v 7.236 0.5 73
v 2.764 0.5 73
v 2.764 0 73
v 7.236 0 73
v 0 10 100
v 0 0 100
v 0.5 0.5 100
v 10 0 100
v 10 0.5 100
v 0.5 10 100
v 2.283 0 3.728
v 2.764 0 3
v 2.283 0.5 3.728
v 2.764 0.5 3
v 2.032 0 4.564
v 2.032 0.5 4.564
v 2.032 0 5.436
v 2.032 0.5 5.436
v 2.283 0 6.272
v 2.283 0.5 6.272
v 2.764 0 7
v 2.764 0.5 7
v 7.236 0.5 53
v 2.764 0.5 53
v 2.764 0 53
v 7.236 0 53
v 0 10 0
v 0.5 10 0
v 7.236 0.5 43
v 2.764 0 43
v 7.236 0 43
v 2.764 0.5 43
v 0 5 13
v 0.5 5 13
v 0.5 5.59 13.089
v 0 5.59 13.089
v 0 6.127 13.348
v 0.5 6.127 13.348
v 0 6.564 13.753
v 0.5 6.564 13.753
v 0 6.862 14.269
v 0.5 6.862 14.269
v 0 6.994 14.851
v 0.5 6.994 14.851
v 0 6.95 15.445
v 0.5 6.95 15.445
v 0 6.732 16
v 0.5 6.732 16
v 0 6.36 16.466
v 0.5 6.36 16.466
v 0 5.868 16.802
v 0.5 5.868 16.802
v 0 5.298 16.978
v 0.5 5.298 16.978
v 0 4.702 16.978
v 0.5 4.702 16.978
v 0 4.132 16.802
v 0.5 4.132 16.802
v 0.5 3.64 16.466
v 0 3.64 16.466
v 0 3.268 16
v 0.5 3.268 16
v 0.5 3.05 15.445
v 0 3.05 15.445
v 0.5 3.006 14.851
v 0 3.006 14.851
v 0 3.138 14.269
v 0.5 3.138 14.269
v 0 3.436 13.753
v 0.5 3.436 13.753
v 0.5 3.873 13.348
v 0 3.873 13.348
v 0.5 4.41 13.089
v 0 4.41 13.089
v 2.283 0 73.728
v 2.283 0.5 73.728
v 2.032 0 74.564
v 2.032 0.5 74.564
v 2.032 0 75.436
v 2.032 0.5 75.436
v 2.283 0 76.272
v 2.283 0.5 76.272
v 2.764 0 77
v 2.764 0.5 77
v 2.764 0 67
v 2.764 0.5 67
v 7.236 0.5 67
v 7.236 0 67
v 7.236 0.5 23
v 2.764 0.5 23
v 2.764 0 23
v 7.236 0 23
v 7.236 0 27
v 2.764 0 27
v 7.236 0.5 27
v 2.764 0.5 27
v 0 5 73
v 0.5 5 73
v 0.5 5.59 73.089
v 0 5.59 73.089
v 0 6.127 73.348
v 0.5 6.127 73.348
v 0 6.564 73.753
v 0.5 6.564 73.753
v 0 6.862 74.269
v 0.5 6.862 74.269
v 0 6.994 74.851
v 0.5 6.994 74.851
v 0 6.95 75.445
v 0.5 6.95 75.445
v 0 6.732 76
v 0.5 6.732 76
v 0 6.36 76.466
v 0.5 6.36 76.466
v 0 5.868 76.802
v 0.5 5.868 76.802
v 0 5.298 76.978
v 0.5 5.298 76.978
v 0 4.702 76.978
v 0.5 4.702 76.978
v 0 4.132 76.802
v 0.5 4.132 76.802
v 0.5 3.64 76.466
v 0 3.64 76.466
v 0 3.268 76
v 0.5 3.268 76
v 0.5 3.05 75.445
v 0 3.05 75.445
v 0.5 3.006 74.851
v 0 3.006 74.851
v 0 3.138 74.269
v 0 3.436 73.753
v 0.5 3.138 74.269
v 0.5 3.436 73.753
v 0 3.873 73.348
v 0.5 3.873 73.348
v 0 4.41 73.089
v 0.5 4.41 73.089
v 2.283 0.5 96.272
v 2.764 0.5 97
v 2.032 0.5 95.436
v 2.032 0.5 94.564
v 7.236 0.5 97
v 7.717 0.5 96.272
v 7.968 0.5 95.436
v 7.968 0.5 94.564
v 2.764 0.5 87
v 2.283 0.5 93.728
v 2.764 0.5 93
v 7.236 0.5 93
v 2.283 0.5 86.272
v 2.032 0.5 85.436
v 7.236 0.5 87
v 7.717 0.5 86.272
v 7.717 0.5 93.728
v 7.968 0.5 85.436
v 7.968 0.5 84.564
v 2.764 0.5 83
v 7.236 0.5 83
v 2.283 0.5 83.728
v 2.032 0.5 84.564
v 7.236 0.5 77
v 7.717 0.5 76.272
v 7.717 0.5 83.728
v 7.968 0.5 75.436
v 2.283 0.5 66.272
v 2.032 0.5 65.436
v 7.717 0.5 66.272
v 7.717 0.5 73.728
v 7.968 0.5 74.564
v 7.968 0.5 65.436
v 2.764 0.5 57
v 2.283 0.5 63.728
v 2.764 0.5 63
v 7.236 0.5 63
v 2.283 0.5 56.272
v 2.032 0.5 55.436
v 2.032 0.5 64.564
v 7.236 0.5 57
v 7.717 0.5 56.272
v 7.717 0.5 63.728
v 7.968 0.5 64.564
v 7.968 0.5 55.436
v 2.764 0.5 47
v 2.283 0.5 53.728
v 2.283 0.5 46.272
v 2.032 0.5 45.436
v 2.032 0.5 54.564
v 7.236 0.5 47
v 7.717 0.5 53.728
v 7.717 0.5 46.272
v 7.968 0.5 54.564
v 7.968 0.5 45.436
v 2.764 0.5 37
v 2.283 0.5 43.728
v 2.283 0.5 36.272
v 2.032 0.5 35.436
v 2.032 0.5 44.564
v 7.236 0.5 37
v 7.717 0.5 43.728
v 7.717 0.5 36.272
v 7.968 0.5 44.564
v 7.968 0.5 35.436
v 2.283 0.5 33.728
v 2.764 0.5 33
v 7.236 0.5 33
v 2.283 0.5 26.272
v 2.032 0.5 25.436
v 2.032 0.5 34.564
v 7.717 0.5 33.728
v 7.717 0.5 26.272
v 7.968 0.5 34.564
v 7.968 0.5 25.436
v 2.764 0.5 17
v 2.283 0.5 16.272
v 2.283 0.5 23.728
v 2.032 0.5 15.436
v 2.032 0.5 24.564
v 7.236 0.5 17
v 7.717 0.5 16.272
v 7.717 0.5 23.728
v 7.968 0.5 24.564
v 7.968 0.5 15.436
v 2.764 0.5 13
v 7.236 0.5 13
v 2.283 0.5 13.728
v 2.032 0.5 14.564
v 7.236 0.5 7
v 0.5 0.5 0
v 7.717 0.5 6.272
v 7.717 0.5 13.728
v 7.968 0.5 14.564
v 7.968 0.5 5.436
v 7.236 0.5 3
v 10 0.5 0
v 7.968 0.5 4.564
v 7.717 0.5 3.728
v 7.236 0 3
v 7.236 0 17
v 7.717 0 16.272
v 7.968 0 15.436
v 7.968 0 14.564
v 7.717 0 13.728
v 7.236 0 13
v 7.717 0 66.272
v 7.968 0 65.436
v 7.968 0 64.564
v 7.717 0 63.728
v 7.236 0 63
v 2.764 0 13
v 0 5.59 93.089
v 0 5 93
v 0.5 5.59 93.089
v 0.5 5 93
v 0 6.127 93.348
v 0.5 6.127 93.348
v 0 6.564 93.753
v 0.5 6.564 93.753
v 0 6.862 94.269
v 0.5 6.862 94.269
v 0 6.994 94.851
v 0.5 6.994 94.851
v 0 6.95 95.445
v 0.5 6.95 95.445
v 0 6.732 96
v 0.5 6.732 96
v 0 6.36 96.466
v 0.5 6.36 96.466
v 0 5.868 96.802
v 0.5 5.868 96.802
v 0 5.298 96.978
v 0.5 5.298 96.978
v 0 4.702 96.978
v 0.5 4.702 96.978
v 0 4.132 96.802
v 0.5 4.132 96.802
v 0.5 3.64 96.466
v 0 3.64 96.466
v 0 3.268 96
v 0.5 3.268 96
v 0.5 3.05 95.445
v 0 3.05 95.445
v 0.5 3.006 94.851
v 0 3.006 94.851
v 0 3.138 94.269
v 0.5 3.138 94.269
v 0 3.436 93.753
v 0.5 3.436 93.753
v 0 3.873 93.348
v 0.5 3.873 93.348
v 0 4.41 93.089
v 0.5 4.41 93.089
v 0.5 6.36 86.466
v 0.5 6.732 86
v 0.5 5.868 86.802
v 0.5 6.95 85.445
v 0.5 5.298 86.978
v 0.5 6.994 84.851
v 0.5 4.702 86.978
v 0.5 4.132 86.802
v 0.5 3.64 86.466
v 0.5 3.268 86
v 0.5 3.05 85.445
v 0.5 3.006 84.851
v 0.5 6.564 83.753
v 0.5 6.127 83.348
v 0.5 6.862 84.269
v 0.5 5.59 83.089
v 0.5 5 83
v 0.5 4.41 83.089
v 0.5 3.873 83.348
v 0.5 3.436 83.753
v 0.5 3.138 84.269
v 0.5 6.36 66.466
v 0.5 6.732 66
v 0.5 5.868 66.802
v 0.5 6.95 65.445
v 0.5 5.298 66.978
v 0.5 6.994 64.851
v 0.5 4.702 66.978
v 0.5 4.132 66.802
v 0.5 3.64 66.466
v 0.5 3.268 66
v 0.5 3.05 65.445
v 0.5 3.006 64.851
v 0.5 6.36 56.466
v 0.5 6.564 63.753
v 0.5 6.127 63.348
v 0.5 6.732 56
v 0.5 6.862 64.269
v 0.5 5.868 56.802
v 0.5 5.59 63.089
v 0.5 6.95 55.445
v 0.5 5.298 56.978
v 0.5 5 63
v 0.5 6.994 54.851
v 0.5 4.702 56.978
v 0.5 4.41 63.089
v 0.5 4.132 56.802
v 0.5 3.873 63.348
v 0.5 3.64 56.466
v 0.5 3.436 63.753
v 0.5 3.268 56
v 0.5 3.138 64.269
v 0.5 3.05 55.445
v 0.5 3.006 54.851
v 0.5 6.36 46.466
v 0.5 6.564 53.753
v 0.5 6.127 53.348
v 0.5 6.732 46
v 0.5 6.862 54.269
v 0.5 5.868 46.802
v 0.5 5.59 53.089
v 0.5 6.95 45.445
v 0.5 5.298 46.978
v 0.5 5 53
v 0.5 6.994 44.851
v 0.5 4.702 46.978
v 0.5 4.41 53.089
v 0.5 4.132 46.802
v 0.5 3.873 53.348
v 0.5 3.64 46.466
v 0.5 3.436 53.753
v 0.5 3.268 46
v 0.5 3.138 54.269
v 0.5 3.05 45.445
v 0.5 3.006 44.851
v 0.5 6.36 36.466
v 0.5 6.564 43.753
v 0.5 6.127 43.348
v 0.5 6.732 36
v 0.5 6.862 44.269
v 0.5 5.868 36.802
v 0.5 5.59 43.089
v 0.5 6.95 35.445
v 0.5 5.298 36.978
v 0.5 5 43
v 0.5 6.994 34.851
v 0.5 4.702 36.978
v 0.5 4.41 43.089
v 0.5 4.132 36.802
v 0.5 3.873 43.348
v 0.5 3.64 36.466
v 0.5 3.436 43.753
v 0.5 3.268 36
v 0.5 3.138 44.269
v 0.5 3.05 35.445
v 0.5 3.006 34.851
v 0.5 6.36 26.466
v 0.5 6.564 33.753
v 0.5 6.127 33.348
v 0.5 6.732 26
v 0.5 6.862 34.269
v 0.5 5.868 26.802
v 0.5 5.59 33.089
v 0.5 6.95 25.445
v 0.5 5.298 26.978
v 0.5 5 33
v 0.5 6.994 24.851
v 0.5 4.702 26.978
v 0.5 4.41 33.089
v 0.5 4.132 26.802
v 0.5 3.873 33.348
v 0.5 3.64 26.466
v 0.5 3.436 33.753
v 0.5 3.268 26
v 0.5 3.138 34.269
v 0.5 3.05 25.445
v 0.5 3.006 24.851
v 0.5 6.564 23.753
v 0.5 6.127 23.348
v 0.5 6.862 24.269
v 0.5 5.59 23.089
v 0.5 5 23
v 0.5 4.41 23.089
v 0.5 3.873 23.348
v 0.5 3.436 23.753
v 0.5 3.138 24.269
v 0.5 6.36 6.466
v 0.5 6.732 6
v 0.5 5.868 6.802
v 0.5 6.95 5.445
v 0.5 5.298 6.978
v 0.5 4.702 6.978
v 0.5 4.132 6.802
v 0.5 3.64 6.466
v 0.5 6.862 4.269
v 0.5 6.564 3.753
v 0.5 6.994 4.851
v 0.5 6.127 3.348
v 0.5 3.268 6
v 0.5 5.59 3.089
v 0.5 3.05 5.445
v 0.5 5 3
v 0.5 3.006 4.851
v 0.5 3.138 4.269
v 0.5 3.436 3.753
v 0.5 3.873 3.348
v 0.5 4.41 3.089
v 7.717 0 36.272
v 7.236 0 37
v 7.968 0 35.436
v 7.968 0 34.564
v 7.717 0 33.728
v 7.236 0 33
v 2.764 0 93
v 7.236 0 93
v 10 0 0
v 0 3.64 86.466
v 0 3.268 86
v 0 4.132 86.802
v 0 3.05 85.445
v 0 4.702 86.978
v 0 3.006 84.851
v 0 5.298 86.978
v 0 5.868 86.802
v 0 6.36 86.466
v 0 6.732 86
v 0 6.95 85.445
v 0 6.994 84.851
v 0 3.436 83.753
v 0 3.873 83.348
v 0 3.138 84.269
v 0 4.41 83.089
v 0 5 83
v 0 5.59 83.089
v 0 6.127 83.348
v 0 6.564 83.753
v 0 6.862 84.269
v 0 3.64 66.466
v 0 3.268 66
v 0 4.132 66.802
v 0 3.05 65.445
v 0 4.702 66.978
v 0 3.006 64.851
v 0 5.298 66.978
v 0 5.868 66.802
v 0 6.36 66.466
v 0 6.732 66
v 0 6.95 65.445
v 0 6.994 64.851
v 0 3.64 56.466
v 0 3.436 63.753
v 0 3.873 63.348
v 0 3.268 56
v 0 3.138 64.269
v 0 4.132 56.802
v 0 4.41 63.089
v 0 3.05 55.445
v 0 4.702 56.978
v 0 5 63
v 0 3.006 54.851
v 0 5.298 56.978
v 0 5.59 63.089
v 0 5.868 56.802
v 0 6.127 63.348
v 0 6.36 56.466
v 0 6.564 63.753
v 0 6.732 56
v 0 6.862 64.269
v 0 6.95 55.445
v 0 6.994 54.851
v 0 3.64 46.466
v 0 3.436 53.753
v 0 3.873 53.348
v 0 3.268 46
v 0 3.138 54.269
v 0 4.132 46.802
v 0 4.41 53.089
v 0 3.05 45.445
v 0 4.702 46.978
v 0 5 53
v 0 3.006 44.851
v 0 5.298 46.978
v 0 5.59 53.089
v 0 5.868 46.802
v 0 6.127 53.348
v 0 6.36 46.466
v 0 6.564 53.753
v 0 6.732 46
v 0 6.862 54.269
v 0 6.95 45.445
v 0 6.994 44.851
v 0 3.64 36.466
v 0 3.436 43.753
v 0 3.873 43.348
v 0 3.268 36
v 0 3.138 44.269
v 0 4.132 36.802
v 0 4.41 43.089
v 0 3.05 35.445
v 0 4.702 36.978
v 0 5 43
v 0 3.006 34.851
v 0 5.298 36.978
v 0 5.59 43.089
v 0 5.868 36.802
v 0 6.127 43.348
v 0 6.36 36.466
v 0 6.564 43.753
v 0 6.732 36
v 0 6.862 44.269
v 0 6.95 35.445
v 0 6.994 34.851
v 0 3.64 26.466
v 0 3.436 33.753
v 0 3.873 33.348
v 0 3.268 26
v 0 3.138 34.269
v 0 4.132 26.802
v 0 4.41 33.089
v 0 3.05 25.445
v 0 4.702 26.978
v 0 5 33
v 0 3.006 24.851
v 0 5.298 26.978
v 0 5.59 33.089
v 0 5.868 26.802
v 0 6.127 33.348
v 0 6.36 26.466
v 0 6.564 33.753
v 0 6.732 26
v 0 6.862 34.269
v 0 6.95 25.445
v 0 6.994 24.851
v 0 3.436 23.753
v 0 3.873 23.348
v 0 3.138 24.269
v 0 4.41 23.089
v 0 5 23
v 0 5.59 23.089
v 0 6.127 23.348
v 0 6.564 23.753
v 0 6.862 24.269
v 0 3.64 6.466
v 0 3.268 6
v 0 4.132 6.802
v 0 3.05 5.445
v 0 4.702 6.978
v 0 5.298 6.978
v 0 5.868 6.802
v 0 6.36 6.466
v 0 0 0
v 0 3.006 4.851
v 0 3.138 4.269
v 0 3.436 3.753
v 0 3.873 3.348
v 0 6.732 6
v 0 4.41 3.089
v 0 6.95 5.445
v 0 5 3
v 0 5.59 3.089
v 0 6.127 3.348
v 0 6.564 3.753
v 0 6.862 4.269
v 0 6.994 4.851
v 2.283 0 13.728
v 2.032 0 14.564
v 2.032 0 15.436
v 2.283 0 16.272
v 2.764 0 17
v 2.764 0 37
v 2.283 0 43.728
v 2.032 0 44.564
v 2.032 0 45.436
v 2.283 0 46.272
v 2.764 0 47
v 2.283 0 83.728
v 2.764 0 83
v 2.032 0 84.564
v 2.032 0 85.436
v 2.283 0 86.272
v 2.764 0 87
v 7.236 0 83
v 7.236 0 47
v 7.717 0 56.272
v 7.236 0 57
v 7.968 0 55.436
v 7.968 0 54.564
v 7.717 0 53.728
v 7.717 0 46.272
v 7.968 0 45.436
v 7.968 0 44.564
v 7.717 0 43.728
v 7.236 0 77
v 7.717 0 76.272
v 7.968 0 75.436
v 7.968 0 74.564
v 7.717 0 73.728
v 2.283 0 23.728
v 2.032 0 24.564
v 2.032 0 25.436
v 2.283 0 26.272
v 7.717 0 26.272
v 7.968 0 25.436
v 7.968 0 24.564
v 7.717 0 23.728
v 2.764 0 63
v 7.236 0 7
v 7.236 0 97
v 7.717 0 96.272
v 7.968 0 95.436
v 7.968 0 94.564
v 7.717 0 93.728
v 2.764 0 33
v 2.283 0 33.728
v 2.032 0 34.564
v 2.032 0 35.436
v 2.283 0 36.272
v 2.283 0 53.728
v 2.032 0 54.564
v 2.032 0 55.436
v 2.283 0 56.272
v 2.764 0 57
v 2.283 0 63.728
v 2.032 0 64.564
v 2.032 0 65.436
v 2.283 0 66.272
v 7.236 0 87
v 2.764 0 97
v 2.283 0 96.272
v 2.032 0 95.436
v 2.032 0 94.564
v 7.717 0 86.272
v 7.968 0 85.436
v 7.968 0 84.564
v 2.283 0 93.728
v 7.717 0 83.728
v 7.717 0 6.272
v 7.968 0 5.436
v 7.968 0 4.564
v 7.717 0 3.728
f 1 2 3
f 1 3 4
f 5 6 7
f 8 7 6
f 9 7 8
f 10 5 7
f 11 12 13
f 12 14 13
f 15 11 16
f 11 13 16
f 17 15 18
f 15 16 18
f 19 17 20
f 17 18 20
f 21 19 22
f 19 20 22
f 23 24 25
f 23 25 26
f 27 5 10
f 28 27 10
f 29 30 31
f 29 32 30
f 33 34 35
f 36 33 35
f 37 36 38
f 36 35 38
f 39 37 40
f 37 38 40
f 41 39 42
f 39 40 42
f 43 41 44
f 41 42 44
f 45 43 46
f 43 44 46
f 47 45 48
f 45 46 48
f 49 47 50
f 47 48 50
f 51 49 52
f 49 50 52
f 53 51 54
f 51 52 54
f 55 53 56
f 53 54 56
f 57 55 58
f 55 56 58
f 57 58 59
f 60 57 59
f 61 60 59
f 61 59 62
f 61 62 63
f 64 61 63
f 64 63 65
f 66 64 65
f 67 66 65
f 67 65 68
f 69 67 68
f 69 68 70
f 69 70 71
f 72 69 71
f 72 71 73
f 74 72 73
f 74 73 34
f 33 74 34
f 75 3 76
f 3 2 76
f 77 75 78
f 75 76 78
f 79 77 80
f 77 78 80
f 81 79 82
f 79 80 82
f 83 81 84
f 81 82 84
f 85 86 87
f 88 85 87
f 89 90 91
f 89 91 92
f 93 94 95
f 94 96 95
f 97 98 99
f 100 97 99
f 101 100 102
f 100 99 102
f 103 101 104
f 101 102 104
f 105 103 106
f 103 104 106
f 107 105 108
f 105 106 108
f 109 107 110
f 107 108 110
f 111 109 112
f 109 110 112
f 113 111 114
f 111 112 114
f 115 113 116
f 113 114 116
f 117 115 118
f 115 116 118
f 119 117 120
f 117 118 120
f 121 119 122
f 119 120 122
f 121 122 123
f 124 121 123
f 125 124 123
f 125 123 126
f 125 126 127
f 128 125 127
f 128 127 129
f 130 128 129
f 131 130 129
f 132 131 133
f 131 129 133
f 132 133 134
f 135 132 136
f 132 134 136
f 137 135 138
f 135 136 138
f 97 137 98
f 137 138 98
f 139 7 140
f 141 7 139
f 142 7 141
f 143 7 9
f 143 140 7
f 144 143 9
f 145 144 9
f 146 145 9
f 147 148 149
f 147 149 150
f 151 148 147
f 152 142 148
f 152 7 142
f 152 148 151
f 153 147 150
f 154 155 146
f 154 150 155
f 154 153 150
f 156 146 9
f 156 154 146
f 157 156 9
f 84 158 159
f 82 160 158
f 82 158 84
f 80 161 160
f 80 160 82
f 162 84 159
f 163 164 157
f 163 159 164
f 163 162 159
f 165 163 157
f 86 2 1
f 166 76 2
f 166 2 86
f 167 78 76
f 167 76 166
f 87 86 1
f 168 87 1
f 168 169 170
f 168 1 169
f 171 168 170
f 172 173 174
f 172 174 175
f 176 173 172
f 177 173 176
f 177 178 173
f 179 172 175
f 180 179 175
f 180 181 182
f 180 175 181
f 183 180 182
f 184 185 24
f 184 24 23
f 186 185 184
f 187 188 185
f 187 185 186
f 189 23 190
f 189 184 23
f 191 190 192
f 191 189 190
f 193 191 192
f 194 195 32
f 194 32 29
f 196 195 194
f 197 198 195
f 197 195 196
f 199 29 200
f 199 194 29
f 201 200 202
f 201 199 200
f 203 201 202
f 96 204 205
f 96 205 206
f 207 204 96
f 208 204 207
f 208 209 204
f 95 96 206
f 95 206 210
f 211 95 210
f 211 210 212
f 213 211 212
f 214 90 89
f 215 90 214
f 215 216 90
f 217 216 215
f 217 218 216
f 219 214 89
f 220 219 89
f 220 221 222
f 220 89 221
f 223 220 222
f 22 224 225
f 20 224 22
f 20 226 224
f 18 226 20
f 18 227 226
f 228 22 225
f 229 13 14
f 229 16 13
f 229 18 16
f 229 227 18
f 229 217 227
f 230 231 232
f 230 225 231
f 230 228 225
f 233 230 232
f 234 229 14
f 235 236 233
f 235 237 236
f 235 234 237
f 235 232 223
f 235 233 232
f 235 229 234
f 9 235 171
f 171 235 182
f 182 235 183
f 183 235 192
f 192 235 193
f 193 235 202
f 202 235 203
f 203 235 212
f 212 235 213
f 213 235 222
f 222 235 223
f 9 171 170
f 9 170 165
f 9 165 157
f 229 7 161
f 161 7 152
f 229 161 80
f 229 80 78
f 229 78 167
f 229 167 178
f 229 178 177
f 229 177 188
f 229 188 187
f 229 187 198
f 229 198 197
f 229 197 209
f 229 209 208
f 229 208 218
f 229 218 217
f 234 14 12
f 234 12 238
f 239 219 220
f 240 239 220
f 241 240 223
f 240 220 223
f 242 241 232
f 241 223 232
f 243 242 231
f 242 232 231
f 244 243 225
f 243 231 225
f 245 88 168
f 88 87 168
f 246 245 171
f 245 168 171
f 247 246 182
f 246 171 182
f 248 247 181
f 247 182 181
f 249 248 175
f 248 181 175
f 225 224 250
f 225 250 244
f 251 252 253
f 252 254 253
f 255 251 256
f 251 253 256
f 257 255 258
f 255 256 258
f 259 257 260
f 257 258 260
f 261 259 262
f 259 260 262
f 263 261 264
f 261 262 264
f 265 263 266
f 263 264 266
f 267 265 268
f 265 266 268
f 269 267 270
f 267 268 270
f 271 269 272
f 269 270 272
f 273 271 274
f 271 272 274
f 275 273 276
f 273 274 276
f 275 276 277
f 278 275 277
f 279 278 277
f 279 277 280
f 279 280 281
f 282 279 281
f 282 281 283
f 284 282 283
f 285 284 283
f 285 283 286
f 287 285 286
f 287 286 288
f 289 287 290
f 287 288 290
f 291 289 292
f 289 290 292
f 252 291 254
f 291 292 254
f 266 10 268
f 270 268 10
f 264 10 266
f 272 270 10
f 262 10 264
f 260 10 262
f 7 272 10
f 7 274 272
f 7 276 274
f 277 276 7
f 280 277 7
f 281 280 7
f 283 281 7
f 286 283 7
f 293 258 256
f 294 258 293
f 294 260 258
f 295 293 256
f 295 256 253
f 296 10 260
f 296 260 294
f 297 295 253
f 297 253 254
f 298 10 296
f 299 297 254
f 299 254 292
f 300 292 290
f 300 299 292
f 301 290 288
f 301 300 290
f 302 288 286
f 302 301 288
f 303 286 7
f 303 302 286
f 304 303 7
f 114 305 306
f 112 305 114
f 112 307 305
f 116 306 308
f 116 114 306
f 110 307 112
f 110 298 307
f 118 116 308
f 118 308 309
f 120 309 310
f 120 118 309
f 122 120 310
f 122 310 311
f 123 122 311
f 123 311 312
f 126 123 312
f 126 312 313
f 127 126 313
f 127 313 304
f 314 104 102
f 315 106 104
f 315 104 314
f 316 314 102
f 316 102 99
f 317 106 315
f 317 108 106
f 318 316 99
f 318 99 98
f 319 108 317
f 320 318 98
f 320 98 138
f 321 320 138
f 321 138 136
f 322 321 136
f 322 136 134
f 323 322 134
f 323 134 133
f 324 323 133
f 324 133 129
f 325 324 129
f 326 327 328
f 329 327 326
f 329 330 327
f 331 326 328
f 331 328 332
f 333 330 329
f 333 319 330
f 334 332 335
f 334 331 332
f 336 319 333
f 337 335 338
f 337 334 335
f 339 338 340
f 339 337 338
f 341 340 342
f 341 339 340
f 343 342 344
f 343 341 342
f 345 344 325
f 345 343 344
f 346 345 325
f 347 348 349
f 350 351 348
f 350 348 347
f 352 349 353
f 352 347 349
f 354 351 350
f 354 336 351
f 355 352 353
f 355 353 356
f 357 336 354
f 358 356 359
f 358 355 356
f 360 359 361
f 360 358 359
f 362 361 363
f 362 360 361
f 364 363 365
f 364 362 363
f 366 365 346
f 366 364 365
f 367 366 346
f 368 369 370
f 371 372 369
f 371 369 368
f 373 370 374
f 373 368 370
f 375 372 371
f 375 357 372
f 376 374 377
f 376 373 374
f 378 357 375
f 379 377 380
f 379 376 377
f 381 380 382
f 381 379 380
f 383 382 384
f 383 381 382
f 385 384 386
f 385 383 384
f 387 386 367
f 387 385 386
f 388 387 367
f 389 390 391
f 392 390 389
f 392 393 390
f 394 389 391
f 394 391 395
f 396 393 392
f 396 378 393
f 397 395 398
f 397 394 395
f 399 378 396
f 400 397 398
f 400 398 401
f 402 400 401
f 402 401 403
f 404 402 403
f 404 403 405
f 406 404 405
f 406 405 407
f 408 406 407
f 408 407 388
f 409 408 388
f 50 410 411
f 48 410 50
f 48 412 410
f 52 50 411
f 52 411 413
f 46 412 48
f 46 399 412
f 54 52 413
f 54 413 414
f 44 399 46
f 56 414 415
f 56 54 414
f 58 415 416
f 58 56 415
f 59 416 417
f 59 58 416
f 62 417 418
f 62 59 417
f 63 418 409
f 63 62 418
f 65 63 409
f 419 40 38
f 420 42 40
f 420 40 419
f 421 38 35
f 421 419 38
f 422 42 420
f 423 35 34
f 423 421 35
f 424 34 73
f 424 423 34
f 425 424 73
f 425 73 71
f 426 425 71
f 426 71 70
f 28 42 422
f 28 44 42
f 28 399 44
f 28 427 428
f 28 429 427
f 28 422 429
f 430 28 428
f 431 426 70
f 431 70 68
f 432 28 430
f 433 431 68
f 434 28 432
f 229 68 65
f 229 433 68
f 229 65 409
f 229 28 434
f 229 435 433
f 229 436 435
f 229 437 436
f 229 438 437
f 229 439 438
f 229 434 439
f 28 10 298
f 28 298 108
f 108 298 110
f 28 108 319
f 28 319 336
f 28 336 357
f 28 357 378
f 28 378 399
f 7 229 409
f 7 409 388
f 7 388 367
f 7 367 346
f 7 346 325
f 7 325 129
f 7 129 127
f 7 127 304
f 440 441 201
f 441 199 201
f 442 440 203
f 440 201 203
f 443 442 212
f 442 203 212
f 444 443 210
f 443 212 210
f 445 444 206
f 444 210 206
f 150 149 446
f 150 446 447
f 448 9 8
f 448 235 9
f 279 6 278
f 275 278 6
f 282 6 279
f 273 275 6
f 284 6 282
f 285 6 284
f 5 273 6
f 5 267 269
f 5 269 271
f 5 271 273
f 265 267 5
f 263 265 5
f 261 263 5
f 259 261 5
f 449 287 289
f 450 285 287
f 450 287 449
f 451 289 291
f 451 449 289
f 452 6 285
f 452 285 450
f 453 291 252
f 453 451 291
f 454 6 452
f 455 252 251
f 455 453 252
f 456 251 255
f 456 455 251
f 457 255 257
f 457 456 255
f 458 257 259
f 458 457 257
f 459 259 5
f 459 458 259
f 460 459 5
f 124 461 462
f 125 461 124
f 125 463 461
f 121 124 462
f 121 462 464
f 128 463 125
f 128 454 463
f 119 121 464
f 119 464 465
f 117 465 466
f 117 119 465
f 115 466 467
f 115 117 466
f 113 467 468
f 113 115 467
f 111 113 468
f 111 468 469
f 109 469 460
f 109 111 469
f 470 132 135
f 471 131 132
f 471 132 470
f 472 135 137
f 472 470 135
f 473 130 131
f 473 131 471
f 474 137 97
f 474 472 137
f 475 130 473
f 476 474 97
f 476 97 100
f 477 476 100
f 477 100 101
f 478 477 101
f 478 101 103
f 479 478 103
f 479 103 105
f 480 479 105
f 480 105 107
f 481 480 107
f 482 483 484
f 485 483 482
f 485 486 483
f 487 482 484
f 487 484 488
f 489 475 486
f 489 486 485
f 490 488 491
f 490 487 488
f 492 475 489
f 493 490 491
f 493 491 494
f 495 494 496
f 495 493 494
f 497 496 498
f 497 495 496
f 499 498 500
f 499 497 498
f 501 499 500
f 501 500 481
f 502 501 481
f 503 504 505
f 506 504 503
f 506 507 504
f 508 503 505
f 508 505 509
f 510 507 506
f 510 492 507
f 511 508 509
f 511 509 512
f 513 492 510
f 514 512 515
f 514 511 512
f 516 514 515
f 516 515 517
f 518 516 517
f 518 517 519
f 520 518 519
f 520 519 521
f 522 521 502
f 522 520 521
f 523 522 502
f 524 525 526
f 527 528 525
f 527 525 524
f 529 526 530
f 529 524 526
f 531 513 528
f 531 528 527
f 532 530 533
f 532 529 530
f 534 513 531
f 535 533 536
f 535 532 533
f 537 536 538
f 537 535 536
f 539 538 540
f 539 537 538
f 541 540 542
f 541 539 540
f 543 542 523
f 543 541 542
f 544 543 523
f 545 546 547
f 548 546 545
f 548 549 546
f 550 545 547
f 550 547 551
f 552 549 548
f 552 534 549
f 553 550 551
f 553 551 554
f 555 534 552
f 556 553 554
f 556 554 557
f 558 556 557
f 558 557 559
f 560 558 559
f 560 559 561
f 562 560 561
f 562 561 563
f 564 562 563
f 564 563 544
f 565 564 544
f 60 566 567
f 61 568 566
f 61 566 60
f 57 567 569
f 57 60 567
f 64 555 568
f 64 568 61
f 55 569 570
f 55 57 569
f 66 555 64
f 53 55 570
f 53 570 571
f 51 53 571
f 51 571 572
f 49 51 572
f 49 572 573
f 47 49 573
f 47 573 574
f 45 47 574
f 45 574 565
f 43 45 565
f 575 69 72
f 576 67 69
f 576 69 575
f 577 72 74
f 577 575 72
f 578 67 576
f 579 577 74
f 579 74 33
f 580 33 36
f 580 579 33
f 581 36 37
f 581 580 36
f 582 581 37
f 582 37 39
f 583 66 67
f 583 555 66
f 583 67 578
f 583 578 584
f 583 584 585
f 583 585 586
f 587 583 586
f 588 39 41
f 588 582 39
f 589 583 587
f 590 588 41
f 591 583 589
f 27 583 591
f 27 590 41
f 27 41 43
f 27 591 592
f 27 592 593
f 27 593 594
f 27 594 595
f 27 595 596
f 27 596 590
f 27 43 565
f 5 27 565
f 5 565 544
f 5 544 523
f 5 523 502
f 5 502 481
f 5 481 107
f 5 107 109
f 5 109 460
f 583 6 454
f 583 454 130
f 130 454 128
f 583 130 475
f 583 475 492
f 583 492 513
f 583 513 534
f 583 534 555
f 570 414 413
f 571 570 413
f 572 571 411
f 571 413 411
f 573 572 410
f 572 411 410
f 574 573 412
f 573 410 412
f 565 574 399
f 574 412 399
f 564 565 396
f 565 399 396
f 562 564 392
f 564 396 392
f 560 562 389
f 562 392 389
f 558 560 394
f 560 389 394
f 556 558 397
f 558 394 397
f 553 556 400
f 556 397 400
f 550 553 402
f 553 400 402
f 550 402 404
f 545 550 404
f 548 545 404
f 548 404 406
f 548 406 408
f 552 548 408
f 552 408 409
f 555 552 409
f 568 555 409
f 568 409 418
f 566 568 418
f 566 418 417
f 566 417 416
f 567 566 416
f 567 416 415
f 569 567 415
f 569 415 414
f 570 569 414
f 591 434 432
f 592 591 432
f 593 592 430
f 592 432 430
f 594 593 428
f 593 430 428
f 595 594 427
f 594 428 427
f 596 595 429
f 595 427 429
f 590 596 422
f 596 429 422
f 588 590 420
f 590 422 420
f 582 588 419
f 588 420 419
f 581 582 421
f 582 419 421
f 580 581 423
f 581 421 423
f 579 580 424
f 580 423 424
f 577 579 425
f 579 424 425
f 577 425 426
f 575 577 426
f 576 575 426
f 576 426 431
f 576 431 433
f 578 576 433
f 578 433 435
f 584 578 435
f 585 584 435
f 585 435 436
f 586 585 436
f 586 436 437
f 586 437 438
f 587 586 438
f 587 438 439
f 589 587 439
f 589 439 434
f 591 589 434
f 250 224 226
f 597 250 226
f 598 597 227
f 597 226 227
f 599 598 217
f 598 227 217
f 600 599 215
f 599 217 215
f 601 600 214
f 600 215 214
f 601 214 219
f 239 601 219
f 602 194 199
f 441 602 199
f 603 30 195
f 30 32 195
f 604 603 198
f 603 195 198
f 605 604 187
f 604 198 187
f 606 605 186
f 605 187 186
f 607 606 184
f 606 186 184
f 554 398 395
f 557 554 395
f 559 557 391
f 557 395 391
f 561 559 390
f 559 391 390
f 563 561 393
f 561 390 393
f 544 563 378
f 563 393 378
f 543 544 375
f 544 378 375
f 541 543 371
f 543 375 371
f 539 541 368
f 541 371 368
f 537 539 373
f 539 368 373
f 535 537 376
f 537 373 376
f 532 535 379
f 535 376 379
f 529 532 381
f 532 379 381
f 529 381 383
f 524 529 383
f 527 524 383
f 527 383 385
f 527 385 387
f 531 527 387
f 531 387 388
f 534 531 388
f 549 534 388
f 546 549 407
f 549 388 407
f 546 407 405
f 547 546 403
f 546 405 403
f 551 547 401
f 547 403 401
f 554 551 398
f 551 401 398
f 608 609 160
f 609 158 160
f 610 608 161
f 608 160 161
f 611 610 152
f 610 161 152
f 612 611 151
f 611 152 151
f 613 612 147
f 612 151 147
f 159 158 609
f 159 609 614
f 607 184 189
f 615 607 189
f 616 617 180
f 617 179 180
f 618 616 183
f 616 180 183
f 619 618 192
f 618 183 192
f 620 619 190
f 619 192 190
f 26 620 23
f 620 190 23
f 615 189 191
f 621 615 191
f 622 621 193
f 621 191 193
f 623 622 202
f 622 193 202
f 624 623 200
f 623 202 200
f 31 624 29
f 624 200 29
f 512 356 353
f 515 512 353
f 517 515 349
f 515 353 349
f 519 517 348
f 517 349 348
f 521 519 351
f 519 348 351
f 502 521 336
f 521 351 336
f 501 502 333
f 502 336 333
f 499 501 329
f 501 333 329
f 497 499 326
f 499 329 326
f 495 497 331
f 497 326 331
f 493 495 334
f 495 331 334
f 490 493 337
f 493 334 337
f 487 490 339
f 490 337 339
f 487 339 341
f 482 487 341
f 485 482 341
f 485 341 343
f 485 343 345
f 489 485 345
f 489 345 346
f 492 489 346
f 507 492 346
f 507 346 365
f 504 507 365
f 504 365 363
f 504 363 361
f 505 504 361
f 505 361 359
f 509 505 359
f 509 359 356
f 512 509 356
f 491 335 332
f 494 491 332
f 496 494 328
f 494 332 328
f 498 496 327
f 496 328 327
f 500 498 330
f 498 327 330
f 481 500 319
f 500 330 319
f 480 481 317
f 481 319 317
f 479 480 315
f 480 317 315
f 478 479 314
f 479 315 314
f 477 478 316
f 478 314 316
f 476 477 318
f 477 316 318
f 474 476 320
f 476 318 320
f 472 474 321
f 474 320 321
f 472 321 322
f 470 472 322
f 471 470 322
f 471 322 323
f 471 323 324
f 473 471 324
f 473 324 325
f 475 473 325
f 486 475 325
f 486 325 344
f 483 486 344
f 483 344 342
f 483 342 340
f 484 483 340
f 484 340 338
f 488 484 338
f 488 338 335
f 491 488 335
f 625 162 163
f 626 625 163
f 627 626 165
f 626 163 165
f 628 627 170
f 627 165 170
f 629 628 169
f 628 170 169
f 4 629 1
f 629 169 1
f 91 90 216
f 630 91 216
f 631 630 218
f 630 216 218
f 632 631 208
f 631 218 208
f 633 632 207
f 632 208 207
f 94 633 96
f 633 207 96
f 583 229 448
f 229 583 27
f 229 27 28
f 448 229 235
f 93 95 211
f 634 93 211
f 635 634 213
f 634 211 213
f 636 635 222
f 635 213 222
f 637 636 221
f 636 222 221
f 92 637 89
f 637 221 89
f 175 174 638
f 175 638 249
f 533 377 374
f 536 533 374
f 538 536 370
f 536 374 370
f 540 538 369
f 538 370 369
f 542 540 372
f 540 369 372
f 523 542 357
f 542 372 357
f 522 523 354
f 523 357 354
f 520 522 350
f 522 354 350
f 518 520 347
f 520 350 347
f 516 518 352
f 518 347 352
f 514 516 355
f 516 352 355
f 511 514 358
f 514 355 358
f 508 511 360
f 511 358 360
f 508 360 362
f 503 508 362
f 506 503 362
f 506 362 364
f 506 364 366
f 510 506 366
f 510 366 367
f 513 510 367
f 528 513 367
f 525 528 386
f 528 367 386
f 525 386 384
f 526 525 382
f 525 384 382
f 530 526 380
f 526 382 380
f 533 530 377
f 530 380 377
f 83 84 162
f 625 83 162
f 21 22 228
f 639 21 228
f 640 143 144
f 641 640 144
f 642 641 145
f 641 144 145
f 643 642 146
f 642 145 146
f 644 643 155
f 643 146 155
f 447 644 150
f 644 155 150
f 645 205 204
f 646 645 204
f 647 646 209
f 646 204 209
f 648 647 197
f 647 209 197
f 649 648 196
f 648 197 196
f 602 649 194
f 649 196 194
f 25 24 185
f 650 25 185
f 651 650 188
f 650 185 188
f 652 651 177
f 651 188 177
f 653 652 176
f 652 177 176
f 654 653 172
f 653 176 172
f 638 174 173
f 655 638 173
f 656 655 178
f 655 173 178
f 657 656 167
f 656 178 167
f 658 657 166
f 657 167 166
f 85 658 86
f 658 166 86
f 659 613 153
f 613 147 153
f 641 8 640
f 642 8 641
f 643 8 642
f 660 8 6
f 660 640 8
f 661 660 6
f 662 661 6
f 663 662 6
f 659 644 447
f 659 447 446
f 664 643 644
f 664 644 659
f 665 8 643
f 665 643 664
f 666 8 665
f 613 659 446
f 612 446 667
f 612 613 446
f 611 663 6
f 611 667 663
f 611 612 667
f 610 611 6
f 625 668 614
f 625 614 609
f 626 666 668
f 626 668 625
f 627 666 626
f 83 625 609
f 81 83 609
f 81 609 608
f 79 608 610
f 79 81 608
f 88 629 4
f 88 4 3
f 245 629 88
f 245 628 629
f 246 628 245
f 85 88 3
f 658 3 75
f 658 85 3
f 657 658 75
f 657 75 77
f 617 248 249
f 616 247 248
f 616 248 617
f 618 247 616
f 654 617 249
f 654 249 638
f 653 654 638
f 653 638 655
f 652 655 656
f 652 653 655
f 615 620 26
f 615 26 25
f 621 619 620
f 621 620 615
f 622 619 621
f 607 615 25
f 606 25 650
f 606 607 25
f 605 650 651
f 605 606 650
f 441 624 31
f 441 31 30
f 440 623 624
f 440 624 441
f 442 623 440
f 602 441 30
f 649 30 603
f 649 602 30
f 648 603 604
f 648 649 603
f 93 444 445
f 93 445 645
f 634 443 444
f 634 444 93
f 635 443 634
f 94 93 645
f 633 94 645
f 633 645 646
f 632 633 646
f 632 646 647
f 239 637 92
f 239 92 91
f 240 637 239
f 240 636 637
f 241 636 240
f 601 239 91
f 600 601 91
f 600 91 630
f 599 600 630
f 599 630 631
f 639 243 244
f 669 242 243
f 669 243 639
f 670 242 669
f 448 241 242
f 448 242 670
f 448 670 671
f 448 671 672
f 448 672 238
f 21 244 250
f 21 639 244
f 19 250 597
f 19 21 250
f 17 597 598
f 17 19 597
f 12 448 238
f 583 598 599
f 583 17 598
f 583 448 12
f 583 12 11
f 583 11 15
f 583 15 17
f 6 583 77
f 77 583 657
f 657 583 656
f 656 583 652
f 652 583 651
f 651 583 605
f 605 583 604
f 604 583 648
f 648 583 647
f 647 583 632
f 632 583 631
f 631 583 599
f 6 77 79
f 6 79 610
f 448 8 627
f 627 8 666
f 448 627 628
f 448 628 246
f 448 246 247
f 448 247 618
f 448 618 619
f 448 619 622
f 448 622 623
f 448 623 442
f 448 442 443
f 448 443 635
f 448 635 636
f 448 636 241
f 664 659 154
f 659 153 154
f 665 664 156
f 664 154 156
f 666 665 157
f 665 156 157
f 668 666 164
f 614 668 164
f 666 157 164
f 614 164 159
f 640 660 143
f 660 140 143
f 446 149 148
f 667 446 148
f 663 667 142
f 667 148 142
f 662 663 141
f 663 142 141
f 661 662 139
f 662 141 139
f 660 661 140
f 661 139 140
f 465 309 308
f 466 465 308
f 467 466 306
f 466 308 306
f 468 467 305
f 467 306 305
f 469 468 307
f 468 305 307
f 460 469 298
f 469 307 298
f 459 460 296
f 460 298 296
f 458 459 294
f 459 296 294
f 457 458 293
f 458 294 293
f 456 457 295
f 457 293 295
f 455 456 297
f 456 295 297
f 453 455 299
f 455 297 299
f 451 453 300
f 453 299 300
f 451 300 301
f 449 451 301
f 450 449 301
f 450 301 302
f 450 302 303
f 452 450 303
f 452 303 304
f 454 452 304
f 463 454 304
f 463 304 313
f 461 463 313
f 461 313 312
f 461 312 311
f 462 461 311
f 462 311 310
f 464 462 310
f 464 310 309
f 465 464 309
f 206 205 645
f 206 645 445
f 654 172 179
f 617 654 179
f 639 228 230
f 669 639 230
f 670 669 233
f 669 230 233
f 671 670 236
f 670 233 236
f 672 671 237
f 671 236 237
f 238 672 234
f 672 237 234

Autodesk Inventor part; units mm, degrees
ref_plane "YZ Plane" through (0, 0, 0) normal (1, 0, 0) x (0, 1, 0)
ref_plane "XZ Plane" through (0, 0, 0) normal (0, 1, 0) x (-1, 0, 0)
ref_plane "XY Plane" through (0, 0, 0) normal (0, 0, 1) x (1, 0, 0)
sketch "Náčrt1" plane through (0, 0, 0) normal (0, 0, 1) x (1, 0, 0)
  line L0 (1.3202, 0) -> (0, 0)
  line L1 (0, 0) -> (0, 10)
  line L2 (0, 10) -> (0.5, 10)
  line L3 (0.5, 10) -> (0.5, 0.5)
  line L4 (0.5, 0.5) -> (10, 0.5)
  line L5 (10, 0.5) -> (10, 0)
  line L6 (10, 0) -> (1.3202, 0)
  point P0 (10, 0.25)
  point P1 (0.25, 10)
  dimension "d0" = 0.5
  dimension "d1" = 0.5
  dimension "d2" = 10
  dimension "d3" = 10
extrude "Vysunutí1" add sketch "Náčrt1" along normal blind 100
sketch "Náčrt2" plane through (0.5, 0.5, 0) normal (0, 1, 0) x (1, 0, 0)
  line L0 (9.5, 0) -> (0, 0) projected
  line L1 (9.5, 0) -> (9.5, -100) projected
  line L2 (2.2639, -3) -> (6.7361, -3)
  line L3 (2.2639, -7) -> (6.7361, -7)
  arc A0 (2.2639, -3) -> (2.2639, -7) centre (4.5, -5) ccw
  arc A1 (6.7361, -7) -> (6.7361, -3) centre (4.5, -5) ccw
  point P0 (-0.5, 0)
  point P1 (4.8669, -7)
  dimension "d7" = 5
  dimension "d8" = 5
  dimension "d9" = 2
  dimension "d10" = 4
extrude "Vysunutí2" cut sketch "Náčrt2" against normal through all
pattern_linear "Obdélníkové pole1" count 10 spacing 10 along (0, 0, 1) of "Vysunutí2"
sketch "Náčrt4" plane through (0.5, 0.5, 0) normal (1, 0, 0) x (0, 0, -1)
  line L0 (0, 0) -> (0, 9.5) projected
  line L1 (0, 9.5) -> (-100, 9.5) projected
  line L2 (-100, 0) -> (-100, 9.5) projected
  circle A0 centre (-5, 4.5) radius 2
  point P0 (0, -0.5)
  point P1 (-5, 9.5)
  point P2 (0, 4.5)
  point P3 (-100, 4.5)
  point P4 (-95, 9.5)
  dimension "d30" = 4
extrude "Vysunutí4" cut sketch "Náčrt4" against normal blind 10
sketch "Náčrt5" plane through (0.5, 0.5, 100) normal (1, 0, 0) x (0, 0, -1)
  circle A0 centre (5, 4.5) radius 2
  line L0 (100, 9.5) -> (0, 9.5) projected
  line L1 (0, 0) -> (0, 9.5) projected
  point P0 (100, -0.5)
  point P1 (95, 9.5)
  point P2 (5, 9.5)
  point P3 (0, 4.5)
  dimension "d33" = 4
  dimension "d34" = 5
  dimension "d35" = 5
extrude "Vysunutí5" cut sketch "Náčrt5" against normal blind 10
pattern_linear "Obdélníkové pole3" count 10 spacing 10 along (0, 0, -1) of "Vysunutí5"
properties part number "1027"
